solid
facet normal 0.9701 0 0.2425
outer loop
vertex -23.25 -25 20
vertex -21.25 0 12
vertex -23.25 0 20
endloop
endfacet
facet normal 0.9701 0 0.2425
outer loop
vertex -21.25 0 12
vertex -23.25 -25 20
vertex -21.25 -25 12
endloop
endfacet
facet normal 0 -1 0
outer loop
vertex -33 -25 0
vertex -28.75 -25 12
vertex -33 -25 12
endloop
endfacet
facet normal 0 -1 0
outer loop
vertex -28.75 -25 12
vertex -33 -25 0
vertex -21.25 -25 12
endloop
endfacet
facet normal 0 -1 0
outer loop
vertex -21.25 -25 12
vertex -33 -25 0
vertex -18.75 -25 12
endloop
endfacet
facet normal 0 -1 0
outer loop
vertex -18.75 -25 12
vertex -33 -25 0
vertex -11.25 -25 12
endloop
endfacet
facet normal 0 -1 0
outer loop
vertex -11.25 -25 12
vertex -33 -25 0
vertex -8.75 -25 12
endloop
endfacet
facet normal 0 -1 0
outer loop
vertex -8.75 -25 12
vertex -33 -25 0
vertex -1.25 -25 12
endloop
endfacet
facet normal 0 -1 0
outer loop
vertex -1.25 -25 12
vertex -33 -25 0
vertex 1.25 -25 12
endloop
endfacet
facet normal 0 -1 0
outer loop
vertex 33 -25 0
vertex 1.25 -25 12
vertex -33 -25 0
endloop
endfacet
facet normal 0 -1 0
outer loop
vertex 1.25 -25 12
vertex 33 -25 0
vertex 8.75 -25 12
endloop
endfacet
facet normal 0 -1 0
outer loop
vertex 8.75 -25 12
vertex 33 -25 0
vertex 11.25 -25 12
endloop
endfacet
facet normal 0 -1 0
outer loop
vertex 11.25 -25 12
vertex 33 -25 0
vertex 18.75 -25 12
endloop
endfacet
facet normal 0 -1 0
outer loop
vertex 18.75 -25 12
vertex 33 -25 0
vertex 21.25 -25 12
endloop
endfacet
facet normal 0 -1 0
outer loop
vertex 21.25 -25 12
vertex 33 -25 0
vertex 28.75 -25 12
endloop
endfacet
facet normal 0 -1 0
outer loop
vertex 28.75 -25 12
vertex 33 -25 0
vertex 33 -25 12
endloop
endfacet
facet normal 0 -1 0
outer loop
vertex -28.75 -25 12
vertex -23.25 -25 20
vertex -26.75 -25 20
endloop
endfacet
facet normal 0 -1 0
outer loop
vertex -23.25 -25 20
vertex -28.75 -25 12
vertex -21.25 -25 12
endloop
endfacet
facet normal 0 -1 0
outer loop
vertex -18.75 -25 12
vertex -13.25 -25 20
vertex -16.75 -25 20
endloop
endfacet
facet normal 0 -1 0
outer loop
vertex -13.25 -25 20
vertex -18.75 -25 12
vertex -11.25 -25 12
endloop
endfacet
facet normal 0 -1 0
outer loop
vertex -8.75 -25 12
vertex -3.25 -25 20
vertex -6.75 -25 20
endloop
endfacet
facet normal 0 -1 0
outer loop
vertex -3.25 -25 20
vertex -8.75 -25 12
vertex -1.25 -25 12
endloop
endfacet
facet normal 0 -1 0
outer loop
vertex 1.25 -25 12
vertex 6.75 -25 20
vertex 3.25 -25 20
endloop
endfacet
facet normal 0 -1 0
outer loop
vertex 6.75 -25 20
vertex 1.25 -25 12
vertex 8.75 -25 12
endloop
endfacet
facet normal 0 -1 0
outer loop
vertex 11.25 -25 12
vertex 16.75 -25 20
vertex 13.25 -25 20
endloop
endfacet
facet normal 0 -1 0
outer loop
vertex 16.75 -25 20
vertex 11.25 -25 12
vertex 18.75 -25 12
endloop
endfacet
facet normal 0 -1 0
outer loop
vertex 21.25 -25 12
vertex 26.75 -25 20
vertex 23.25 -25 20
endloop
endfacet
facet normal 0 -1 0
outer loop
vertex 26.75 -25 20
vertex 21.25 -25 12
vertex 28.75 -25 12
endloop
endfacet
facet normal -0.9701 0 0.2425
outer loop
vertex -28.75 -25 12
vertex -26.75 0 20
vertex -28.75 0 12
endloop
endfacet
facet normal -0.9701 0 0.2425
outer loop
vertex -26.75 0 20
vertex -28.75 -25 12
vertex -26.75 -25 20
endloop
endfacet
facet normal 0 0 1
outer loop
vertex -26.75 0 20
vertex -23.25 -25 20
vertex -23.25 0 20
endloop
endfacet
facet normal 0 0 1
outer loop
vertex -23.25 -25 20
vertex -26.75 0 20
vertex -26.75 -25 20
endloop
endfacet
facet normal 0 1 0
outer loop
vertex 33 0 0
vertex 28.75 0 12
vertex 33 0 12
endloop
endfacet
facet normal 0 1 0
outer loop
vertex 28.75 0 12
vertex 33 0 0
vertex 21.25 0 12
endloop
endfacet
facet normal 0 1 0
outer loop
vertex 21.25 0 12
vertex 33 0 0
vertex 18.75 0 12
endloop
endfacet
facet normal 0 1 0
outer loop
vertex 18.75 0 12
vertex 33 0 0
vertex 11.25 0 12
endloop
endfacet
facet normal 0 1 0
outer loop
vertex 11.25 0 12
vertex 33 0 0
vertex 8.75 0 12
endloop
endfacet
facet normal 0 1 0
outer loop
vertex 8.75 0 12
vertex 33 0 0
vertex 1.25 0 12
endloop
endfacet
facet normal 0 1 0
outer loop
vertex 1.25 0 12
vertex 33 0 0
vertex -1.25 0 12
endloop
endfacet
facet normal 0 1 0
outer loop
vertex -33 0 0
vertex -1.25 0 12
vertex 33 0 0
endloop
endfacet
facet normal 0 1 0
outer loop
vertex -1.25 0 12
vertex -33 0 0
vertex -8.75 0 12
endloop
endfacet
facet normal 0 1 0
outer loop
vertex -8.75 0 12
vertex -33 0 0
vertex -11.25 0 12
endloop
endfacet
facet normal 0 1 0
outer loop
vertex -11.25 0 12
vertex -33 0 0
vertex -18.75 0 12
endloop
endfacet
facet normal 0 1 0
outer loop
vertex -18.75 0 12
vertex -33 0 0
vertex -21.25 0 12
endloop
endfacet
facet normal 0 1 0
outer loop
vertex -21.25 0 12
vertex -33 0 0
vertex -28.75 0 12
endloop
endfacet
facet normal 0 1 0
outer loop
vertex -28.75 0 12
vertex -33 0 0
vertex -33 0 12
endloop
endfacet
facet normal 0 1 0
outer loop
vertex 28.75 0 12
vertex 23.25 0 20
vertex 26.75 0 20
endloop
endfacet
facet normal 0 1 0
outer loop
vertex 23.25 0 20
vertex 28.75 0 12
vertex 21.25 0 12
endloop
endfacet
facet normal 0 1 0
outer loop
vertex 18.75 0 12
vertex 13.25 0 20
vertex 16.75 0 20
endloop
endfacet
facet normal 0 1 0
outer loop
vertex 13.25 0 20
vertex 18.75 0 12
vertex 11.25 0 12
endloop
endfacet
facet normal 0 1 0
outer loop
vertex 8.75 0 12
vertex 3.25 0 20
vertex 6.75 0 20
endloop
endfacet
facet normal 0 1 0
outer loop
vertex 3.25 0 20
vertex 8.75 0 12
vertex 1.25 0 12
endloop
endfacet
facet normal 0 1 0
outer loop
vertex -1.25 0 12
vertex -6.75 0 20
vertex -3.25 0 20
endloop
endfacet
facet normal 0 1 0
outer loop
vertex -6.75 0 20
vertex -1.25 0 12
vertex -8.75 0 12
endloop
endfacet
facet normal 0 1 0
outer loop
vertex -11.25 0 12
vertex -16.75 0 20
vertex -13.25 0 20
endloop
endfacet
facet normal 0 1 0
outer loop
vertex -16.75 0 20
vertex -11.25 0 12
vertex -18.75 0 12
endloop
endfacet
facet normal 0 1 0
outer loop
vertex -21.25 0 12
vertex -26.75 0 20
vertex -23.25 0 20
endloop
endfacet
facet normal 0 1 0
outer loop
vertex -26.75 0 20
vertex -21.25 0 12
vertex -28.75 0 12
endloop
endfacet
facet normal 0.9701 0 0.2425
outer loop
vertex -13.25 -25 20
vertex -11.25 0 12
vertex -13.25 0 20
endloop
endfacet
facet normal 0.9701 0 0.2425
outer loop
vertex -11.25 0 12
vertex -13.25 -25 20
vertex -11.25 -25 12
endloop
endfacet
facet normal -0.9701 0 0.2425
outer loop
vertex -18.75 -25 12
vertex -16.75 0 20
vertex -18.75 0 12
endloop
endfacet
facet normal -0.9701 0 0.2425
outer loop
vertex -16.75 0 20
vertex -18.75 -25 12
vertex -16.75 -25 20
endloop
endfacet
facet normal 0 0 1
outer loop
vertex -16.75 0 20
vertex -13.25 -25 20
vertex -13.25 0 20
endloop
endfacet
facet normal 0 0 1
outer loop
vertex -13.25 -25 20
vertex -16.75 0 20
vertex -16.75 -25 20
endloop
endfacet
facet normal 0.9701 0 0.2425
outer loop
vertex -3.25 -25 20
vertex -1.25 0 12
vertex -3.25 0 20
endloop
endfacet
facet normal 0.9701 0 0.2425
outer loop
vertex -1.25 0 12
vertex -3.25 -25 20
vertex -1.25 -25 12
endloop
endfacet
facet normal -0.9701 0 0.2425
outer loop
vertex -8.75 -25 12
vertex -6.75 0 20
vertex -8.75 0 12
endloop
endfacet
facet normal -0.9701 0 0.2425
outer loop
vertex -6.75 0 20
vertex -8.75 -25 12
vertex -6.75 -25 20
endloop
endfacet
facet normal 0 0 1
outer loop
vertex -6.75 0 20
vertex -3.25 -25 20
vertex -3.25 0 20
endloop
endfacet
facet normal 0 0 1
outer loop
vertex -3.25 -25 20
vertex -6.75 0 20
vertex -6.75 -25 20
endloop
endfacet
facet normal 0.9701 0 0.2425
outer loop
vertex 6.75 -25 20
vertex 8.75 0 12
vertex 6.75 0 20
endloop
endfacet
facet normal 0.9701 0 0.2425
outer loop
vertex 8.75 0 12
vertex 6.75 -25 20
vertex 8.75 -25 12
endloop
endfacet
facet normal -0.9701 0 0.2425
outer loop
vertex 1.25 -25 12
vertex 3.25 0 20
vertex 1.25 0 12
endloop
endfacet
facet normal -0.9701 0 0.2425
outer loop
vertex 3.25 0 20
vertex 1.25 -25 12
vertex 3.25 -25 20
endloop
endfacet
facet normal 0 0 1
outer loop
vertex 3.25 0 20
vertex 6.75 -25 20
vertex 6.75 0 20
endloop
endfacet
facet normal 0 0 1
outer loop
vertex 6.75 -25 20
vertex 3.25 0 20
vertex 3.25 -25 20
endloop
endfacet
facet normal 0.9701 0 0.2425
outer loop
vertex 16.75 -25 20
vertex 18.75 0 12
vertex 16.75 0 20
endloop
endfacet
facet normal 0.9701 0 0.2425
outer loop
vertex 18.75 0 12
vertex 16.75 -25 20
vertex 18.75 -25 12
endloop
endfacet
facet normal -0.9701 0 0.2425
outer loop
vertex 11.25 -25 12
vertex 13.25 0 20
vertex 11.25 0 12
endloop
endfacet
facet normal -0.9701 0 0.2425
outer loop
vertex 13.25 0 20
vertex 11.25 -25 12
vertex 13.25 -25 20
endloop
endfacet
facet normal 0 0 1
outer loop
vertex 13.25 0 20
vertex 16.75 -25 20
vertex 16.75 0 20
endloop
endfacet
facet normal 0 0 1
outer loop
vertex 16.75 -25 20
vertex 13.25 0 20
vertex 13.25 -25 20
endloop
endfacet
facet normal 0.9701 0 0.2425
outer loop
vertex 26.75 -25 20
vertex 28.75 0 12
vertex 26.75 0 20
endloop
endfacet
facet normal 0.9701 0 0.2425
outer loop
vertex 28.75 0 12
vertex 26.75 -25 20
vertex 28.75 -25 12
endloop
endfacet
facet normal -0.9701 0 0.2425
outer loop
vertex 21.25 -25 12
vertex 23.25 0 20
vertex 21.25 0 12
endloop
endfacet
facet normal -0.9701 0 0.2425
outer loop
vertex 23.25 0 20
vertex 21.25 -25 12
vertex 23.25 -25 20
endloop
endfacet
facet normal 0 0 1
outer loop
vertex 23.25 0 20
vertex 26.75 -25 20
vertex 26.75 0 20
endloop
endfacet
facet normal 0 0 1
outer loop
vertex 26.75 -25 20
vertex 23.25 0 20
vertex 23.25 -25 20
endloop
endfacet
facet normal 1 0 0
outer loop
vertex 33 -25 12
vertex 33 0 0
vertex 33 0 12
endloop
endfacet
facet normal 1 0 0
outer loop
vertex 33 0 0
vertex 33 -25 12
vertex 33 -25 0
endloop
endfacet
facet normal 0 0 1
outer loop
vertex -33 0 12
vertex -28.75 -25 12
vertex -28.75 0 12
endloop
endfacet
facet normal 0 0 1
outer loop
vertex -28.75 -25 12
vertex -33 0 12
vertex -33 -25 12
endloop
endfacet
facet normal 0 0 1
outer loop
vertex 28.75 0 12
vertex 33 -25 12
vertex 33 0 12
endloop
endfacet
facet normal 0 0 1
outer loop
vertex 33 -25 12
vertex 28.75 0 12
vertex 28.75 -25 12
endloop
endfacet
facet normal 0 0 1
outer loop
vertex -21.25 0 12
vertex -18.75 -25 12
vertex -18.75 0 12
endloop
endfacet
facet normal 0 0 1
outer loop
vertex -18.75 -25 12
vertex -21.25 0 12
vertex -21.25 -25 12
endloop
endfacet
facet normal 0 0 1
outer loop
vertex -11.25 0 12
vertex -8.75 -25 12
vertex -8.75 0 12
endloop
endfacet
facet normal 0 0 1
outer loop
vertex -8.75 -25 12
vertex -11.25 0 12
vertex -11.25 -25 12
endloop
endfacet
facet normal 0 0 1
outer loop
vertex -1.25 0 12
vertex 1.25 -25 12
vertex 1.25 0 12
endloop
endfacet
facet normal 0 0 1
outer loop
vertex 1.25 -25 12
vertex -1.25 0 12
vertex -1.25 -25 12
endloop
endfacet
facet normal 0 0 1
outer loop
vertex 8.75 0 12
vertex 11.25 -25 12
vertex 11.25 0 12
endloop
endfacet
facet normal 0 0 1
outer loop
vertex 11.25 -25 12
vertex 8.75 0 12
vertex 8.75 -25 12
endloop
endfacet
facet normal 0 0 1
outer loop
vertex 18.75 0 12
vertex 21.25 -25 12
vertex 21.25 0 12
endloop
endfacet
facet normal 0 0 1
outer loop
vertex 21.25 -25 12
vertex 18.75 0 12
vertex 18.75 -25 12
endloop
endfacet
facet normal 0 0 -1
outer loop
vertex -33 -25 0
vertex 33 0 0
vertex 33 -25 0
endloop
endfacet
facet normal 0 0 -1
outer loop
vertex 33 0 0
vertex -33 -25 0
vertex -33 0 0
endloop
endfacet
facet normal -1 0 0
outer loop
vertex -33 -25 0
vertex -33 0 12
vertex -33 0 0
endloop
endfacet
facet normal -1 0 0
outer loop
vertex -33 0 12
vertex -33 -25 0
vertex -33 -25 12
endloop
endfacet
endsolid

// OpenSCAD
$fn = 32;

// ----------------------------------------------------------------------
// Toothed rack, 6 teeth
// 10 mm pitch, 8 mm teeth
// ----------------------------------------------------------------------

// --- parameters (mm) ---
bar_w = 25;     // bar width (Y)
bar_h = 12;     // bar height (Z)
teeth = 6;      // number of teeth
pitch = 10;     // tooth pitch
tooth_h = 8;    // tooth height above the bar
root_w = 8;     // tooth width at the root
crest_w = 3.5;  // tooth width at the crest

// --- derived feature positions (mm) ---
span = (teeth - 1) * pitch;  // = 50   distance between the outer teeth
bar_l = span + root_w + 8;   // = 66   bar length: teeth plus 4 mm at each end
tooth_x = -span / 2;         // = -25   X of the first tooth
height = bar_h + tooth_h;    // = 20   overall height
feature_centers = [
  [tooth_x + 0 * pitch, -bar_w / 2],
  [tooth_x + 1 * pitch, -bar_w / 2],
  [tooth_x + 2 * pitch, -bar_w / 2],
  [tooth_x + 3 * pitch, -bar_w / 2],
  [tooth_x + 4 * pitch, -bar_w / 2],
  [tooth_x + 5 * pitch, -bar_w / 2]
];   // tooth centre line, drives the tooth loop

// bar with a rack of teeth, one extruded trapezoium per centre
module rack_tooth() {
  linear_extrude(height = bar_w)
    polygon(points = [
      [0, 0],
      [root_w, 0],
      [root_w / 2 + crest_w / 2, tooth_h + 1],
      [root_w / 2 - crest_w / 2, tooth_h + 1]
    ]);
}

union() {
  translate([-bar_l / 2, -bar_w, 0]) cube([bar_l, bar_w, bar_h]);
  for (centre = feature_centers)
    translate([centre[0] - root_w / 2, 0, bar_h - 1]) rotate([90, 0, 0]) rack_tooth();
}
